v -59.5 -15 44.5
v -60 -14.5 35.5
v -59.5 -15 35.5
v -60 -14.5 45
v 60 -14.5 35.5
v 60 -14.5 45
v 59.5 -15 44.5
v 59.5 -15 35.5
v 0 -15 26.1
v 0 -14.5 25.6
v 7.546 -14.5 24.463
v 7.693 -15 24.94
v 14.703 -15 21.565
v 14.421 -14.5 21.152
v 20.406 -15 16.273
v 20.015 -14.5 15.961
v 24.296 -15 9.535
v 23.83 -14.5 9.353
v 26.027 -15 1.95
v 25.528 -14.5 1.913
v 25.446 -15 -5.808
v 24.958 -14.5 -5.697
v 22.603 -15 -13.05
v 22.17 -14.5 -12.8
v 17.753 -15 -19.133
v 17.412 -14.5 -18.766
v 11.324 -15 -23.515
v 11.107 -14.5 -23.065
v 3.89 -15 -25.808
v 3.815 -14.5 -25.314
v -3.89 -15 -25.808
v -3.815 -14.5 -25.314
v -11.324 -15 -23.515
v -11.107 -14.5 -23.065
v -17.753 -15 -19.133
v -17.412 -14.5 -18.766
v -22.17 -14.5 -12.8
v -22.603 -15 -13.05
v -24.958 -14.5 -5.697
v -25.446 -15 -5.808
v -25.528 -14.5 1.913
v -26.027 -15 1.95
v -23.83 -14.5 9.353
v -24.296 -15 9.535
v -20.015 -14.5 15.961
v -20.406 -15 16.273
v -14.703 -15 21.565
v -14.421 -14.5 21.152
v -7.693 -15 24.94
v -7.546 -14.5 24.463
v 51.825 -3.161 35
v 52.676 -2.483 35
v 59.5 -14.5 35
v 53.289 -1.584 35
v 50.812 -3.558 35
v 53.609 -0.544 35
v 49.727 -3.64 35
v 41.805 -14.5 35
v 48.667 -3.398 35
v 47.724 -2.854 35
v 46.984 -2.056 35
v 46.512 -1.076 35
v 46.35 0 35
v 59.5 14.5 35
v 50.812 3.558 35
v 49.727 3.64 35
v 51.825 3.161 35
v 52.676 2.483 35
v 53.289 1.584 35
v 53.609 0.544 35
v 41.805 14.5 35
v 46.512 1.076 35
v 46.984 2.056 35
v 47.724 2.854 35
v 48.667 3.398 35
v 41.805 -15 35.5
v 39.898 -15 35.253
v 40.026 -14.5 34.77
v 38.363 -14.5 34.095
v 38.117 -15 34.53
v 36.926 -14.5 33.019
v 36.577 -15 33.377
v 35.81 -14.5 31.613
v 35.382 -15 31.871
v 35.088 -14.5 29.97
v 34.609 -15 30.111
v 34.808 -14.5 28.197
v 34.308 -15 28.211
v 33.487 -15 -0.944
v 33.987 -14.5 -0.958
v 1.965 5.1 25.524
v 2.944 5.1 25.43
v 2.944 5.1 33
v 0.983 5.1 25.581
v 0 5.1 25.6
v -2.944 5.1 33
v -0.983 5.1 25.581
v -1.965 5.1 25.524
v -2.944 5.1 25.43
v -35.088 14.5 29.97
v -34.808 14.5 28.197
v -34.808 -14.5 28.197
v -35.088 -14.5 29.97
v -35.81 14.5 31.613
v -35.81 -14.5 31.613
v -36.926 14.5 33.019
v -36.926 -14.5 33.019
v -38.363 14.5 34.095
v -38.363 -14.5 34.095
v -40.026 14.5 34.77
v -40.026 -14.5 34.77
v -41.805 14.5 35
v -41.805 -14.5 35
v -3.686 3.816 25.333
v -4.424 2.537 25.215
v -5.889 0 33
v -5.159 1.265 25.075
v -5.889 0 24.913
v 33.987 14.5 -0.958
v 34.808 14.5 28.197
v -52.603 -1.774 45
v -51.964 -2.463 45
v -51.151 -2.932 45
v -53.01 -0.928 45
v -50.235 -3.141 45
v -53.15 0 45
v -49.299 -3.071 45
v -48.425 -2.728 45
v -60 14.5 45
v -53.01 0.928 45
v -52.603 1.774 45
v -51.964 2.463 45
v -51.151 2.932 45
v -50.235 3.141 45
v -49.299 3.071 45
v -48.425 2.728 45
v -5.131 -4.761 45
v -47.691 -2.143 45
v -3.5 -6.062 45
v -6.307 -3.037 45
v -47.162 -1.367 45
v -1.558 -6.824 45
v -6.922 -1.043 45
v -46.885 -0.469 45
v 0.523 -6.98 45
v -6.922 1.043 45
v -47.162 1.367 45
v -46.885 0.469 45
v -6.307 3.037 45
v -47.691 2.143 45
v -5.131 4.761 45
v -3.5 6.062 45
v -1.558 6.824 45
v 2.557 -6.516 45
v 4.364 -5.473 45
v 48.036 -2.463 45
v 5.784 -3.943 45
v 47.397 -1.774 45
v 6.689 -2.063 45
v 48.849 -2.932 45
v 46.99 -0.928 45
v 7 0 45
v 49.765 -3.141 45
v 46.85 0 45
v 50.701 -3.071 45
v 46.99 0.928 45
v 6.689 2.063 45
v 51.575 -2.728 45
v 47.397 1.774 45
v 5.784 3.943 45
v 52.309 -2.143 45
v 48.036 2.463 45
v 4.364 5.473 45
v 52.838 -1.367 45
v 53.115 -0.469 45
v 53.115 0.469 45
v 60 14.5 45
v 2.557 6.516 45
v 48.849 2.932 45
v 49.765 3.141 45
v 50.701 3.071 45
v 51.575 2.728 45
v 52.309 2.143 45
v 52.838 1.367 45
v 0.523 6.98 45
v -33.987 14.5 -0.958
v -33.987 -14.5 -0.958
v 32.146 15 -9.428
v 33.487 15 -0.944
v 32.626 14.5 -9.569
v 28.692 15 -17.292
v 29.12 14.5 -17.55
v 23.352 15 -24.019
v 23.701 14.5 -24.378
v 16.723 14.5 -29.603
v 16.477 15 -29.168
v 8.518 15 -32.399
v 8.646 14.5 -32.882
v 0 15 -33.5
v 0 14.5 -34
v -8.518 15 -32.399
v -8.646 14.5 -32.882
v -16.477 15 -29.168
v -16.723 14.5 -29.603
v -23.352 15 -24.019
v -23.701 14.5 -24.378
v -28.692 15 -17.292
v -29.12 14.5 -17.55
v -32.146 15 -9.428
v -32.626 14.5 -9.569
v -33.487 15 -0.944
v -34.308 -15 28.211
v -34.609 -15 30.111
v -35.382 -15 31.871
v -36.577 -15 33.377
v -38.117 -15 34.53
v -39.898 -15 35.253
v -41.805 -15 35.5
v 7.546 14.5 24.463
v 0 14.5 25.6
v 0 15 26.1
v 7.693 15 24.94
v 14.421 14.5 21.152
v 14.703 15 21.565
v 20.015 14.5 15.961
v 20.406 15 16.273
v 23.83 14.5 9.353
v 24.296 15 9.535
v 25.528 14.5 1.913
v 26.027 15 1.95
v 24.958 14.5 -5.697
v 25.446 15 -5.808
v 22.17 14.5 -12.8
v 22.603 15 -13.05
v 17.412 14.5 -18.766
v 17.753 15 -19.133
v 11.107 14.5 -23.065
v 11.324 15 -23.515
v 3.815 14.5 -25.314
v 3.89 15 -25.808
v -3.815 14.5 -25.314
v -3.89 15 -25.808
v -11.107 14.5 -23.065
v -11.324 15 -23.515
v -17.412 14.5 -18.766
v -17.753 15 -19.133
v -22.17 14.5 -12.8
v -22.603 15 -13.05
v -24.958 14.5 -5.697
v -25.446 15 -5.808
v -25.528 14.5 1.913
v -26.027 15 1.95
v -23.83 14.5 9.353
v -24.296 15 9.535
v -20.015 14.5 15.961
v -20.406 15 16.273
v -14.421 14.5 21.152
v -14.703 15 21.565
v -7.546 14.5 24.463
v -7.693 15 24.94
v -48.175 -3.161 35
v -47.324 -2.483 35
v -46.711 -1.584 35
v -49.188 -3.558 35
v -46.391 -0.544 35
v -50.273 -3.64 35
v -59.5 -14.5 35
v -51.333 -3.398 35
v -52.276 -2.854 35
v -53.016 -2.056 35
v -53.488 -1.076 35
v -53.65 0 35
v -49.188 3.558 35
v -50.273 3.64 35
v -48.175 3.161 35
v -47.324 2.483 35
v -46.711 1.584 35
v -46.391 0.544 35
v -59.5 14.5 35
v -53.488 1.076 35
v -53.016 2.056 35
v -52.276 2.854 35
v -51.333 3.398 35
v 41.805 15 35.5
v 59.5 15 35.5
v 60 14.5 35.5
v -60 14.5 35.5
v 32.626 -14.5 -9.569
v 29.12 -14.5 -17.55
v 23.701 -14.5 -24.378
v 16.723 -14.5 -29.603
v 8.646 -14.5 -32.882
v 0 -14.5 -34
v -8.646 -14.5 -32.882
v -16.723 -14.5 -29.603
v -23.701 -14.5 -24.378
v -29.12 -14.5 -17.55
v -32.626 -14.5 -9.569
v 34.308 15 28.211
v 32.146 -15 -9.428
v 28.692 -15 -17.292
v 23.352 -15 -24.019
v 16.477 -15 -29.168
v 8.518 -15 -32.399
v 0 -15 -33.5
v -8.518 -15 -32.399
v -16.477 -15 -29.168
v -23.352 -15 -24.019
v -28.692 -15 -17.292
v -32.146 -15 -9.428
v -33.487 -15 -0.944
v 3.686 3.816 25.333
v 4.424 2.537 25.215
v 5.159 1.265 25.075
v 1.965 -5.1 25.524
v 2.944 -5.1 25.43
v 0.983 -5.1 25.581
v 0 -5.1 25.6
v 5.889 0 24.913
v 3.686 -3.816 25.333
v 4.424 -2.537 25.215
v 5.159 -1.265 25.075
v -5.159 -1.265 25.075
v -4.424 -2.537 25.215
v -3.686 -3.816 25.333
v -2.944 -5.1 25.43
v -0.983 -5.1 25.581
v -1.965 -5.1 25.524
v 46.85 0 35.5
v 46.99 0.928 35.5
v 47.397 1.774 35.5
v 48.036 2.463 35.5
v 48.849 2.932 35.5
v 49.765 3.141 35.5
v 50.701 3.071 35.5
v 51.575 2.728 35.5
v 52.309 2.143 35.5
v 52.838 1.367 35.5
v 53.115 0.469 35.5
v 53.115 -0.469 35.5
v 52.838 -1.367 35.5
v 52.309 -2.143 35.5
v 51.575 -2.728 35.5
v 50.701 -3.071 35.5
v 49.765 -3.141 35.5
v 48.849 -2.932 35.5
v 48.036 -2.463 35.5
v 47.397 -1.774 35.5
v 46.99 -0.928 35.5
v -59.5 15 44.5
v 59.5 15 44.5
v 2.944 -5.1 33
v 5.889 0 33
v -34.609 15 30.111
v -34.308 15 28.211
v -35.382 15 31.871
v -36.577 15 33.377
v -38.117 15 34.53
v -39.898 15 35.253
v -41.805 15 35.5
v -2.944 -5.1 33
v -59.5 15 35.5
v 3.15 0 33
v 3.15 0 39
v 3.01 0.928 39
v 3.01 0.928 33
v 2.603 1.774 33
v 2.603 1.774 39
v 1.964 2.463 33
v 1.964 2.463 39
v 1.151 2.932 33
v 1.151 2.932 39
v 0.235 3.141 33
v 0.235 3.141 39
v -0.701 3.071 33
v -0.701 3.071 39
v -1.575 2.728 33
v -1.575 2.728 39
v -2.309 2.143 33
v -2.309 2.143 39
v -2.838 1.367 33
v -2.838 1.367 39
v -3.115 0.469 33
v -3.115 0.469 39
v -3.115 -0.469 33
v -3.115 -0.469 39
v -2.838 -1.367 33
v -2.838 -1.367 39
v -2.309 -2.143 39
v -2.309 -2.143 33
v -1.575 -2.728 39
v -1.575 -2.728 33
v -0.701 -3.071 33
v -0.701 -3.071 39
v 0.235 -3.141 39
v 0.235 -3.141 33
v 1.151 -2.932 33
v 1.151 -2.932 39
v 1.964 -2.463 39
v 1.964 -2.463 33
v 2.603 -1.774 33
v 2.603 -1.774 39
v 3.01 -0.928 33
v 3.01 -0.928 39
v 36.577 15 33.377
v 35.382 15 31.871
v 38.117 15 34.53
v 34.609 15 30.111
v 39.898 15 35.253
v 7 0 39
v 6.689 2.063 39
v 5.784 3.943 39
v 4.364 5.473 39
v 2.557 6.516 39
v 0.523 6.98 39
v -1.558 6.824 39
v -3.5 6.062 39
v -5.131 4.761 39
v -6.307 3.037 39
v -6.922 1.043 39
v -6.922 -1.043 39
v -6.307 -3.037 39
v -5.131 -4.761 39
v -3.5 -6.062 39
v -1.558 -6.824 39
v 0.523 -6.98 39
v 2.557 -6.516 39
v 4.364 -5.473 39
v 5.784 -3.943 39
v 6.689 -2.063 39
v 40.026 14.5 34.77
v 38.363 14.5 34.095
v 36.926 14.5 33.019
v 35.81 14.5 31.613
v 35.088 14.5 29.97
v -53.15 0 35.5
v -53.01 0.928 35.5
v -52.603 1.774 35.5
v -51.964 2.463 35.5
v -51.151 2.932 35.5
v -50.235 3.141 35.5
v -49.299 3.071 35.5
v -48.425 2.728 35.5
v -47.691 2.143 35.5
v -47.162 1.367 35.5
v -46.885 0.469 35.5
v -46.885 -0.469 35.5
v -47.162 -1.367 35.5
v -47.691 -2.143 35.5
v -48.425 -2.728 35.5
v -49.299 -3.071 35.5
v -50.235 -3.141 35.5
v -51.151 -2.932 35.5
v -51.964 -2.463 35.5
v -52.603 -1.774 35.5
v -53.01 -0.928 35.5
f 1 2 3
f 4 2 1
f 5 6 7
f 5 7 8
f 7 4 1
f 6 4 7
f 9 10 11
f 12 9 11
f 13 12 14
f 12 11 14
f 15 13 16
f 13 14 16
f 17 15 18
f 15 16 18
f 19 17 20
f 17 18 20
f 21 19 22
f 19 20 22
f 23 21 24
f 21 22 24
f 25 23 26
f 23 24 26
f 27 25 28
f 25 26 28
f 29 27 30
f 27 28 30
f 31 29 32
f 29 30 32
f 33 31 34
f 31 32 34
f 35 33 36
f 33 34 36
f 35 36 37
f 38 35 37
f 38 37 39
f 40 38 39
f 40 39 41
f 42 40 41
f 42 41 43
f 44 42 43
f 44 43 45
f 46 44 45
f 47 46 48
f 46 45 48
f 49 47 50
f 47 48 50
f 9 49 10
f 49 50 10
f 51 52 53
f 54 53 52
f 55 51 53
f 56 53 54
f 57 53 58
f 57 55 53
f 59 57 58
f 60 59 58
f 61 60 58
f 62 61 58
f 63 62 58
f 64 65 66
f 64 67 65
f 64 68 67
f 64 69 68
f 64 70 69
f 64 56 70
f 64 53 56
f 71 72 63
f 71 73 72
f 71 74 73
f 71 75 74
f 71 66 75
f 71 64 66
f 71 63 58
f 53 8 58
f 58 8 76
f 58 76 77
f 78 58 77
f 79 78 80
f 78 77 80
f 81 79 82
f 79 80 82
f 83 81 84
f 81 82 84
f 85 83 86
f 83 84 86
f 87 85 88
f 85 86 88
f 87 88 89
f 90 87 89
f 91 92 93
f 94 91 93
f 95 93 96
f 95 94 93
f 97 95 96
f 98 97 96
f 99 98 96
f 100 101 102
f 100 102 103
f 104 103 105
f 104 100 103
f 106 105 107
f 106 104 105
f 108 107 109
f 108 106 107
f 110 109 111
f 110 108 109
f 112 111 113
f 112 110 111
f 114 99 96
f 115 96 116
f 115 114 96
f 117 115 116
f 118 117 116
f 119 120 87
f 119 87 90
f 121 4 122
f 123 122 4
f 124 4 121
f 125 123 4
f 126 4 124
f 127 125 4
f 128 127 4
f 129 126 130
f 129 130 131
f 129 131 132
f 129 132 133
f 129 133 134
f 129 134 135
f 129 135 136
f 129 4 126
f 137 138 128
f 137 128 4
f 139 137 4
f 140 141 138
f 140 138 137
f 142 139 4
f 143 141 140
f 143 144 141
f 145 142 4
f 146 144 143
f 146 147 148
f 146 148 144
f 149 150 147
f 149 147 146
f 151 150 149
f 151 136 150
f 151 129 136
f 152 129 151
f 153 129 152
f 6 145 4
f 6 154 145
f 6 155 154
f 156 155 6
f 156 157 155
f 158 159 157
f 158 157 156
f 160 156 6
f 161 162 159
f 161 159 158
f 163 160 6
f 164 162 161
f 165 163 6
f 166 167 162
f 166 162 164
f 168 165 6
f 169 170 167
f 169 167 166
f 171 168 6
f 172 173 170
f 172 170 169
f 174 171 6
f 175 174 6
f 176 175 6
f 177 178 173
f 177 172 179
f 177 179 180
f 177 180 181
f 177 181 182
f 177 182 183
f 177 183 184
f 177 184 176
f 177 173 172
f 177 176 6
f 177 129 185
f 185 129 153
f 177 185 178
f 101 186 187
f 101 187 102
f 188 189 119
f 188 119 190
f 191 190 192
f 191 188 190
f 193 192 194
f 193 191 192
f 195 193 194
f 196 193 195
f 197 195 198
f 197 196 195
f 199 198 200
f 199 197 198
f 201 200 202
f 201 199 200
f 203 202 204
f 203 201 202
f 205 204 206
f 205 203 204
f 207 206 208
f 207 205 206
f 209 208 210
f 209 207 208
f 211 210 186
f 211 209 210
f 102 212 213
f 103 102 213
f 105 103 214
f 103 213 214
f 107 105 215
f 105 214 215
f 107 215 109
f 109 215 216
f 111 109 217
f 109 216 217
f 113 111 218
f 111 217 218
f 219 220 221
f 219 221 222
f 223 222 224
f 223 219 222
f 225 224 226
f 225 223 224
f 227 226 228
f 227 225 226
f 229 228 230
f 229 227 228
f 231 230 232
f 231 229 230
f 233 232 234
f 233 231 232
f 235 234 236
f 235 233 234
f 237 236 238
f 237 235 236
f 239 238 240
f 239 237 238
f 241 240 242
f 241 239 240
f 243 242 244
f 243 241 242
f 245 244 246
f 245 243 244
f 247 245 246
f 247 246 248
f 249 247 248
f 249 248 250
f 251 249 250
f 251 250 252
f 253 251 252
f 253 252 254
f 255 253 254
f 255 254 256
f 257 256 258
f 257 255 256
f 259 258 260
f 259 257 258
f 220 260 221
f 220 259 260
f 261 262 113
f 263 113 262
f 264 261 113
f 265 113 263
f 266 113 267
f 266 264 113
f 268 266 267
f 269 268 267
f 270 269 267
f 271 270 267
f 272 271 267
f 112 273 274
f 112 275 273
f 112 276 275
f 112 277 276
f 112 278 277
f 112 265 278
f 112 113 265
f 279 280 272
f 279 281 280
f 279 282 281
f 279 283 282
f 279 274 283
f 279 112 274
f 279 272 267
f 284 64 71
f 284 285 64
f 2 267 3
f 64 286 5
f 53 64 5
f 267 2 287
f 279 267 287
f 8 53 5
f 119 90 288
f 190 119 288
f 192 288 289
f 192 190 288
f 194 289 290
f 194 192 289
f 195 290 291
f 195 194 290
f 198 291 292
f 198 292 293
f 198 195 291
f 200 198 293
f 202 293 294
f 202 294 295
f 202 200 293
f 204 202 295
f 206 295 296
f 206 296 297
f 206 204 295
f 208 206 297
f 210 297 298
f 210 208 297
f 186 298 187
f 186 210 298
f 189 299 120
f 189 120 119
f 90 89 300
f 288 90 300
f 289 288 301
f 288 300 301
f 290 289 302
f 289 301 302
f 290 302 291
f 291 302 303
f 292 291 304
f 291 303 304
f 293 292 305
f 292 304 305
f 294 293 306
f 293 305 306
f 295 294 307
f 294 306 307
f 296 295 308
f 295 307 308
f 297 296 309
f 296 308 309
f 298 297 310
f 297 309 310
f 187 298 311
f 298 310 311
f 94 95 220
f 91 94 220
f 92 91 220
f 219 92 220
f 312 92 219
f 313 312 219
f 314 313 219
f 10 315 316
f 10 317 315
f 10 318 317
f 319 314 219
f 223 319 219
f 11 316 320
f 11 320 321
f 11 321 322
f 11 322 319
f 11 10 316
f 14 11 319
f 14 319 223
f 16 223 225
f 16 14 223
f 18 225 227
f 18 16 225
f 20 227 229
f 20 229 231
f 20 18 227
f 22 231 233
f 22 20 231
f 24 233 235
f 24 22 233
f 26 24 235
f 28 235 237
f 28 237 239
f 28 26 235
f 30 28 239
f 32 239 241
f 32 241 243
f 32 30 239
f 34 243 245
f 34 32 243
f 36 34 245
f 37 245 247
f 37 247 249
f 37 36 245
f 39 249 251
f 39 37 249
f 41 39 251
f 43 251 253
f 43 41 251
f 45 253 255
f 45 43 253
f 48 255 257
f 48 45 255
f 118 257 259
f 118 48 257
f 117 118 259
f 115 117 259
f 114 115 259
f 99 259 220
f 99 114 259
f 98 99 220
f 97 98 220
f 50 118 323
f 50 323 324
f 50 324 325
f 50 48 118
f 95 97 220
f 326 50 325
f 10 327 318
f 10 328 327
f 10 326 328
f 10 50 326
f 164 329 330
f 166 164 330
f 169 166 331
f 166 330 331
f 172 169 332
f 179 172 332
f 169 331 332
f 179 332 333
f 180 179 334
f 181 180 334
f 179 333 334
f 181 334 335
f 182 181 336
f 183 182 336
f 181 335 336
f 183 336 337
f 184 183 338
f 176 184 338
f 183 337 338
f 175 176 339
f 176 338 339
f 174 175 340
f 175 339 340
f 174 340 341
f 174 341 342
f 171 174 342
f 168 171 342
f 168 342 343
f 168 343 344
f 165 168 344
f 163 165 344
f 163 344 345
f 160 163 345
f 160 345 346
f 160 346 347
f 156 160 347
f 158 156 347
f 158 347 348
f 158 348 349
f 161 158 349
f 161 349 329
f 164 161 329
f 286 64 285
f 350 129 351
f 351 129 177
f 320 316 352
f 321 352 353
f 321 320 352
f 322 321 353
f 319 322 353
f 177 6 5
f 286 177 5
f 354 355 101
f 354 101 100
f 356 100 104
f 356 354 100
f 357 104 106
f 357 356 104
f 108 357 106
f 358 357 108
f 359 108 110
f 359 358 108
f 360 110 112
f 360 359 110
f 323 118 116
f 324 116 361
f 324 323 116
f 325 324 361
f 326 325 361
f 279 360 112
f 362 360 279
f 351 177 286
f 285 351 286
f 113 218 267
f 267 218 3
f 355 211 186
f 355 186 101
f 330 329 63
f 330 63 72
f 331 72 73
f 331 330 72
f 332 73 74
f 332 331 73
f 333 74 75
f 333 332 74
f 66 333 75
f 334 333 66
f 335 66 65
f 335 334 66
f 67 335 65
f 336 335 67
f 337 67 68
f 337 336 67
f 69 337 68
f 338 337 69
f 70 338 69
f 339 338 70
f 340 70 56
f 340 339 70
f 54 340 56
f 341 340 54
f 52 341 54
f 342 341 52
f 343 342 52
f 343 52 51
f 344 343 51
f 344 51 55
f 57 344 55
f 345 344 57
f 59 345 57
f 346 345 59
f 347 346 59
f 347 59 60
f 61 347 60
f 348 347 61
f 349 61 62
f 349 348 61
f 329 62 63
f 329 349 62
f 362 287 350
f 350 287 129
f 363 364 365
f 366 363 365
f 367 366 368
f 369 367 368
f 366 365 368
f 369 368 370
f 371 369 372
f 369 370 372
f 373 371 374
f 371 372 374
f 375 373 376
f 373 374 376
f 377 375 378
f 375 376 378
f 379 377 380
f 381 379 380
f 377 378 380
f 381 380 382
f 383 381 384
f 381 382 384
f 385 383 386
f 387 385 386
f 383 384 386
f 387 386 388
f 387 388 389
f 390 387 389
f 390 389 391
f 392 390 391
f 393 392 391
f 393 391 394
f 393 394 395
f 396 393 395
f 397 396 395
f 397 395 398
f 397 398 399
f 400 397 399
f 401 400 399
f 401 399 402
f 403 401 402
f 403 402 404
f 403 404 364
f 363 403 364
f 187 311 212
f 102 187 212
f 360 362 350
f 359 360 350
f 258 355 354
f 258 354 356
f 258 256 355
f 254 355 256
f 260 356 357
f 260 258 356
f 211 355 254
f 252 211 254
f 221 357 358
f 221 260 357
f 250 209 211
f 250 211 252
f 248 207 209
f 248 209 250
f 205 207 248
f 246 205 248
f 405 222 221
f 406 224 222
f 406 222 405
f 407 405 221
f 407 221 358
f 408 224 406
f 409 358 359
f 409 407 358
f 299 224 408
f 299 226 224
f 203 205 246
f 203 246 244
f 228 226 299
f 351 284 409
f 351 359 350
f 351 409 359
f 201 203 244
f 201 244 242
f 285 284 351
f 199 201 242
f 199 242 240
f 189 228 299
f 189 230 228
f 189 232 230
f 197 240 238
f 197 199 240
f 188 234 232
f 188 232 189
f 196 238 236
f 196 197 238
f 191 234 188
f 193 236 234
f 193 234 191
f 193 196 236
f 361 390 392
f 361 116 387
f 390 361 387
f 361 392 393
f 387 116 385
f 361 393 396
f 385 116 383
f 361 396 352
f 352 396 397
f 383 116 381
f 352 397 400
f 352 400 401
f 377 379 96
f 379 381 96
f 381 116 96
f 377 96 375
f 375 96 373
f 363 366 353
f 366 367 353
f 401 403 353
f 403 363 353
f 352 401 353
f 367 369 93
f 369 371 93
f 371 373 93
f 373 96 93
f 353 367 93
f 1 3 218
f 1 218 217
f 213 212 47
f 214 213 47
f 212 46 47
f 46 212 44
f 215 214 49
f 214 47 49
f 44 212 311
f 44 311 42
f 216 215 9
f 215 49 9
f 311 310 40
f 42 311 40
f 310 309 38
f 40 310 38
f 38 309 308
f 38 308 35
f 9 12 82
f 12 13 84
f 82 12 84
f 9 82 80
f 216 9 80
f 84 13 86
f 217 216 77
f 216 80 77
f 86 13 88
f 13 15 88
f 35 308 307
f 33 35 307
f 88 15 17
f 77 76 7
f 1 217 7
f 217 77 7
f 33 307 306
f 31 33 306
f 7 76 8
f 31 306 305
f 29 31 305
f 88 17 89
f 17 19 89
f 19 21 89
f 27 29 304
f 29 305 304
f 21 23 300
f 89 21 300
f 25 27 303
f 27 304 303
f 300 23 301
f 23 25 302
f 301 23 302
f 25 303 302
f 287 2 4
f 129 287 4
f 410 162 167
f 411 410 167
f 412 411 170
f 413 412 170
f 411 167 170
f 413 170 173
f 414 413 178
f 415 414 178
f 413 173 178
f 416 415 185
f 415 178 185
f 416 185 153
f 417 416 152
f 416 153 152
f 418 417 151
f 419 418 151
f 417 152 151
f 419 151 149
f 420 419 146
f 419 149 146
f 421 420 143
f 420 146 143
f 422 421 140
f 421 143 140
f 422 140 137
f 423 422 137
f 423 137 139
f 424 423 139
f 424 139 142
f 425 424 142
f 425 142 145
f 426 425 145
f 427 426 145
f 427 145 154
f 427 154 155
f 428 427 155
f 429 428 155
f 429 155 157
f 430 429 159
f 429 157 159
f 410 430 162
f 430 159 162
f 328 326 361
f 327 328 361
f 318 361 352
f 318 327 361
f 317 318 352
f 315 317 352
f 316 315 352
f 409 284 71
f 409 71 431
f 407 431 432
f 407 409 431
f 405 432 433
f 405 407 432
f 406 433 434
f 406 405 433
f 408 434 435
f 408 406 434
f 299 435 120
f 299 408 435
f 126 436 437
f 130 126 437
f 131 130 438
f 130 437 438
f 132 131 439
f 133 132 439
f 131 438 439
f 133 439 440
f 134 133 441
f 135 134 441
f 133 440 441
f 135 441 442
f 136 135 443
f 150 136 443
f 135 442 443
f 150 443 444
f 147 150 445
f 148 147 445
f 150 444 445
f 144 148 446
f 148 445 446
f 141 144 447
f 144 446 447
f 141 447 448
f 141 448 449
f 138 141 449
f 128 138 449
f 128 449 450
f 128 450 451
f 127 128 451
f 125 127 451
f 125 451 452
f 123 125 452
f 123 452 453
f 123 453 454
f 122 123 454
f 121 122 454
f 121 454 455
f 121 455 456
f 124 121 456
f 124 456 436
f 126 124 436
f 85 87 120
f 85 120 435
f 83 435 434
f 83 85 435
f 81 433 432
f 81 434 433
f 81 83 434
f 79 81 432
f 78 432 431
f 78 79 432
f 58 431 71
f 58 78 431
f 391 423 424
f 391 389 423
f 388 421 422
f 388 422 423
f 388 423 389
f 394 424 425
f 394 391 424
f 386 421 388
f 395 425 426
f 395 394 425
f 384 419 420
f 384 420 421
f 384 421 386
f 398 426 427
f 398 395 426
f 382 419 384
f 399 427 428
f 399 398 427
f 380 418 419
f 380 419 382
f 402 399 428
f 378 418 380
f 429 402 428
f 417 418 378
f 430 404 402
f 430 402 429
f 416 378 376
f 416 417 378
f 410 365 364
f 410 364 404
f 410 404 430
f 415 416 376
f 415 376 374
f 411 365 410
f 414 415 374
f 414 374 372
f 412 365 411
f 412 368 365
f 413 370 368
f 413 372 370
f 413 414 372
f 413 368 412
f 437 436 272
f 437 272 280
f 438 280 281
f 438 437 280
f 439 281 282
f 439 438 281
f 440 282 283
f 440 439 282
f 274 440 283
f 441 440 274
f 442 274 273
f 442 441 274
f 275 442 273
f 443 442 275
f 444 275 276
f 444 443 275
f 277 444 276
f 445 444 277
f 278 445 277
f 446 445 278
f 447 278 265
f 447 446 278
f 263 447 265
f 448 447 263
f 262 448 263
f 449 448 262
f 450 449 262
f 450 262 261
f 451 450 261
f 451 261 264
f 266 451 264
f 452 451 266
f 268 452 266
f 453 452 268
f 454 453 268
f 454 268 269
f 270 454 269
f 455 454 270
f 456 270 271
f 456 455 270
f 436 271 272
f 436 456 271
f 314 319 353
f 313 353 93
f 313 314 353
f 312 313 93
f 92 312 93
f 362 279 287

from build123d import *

# Parameters (mm, degrees)
SKETCH1_R           = 25.6
BOSS_EXTRUDE1_DEPTH = 15
SKETCH2_R           = 3.15
CUT_EXTRUDE1_DEPTH  = 30
SKETCH3_R           = 7
CUT_EXTRUDE2_DEPTH  = 6
SKETCH4_R           = 3.15
CUT_EXTRUDE3_DEPTH  = 93.660671285
FILLET1_R           = 7
CHAMFER1_SIZE       = 0.5
CUT_EXTRUDE4_DEPTH  = 33


with BuildPart() as part:
    # Sketch1 → Boss-Extrude1 (new, symmetric)
    with BuildSketch(Plane(origin=(0, 0, 0), x_dir=(1, 0, 0), z_dir=(0, 1, 0))):
        with BuildLine():
            Line((-33.986502727, 0.957931299), (-35, -35))
            Line((-35, -35), (-60, -35))
            Line((-60, -35), (-60, -45))
            Line((-60, -45), (60, -45))
            Line((60, -45), (60, -35))
            Line((60, -35), (35, -35))
            Line((35, -35), (33.986502727, 0.957931299))
            ThreePointArc((33.986502727, 0.957931299), (0, 34), (-33.986502727, 0.957931299))
        make_face()
        with Locations(Location((0, 0, 0), (0, 0, 270))):
            Circle(SKETCH1_R, mode=Mode.SUBTRACT)
    extrude(amount=BOSS_EXTRUDE1_DEPTH, both=True)

    # Sketch2 → Cut-Extrude1 (cut)
    with BuildSketch(Plane.XY.offset(45)):
        Circle(SKETCH2_R)
    extrude(amount=-CUT_EXTRUDE1_DEPTH, mode=Mode.SUBTRACT)

    # Sketch3 → Cut-Extrude2 (cut)
    with BuildSketch(Plane.XY.offset(45)):
        Circle(SKETCH3_R)
    extrude(amount=-CUT_EXTRUDE2_DEPTH, mode=Mode.SUBTRACT)

    # Sketch4 → Cut-Extrude3 (cut, through all)
    with BuildSketch(Plane(origin=(0, 0, 35), x_dir=(-1, 0, 0), z_dir=(0, 0, -1))):
        with Locations((-50, 0)):
            Circle(SKETCH4_R)
        with Locations((50, 0)):
            Circle(SKETCH4_R)
    extrude(amount=-CUT_EXTRUDE3_DEPTH, mode=Mode.SUBTRACT)

    # Fillet1
    fillet1_edges = [part.edges().sort_by_distance(p)[0] for p in [
        (-35, 0, 35),
        (35, 0, 35),
    ]]
    fillet(fillet1_edges, radius=FILLET1_R)

    # Chamfer1
    chamfer1_edges = [part.edges().sort_by_distance(p)[0] for p in [
        (-34.397381029, -15, 13.619644926),
        (0, -15, -34),
        (50.90274024, -15, 35),
        (0, 15, -34),
        (60, 0, 35),
        (-60, 0, 35),
        (-34.397381029, 15, 13.619644926),
        (0, -15, -25.6),
        (0, 15, -25.6),
        (-60, 15, 40),
        (0, 15, 45),
        (60, 15, 40),
        (53.15, 0, 35),
        (-46.85, 0, 35),
        (50.90274024, 15, 35),
        (-50.90274024, -15, 35),
        (-50.90274024, 15, 35),
        (34.397381029, -15, 13.619644926),
        (34.397381029, 15, 13.619644926),
        (-36.9259594, -15, 33.018991335),
        (-36.9259594, 15, 33.018991335),
        (36.9259594, -15, 33.018991335),
        (36.9259594, 15, 33.018991335),
        (60, -15, 40),
        (0, -15, 45),
        (-60, -15, 40),
    ]]
    chamfer(chamfer1_edges, length=CHAMFER1_SIZE)

    # Sketch5 → Cut-Extrude4 (cut)
    with BuildSketch(Plane.XY):
        Polygon((2.944486373, 5.1), (-2.944486373, 5.1), (-5.888972746, 0), (-2.944486373, -5.1), (2.944486373, -5.1), (5.888972746, 0), align=None)
    extrude(amount=CUT_EXTRUDE4_DEPTH, mode=Mode.SUBTRACT)


solid = part.part
